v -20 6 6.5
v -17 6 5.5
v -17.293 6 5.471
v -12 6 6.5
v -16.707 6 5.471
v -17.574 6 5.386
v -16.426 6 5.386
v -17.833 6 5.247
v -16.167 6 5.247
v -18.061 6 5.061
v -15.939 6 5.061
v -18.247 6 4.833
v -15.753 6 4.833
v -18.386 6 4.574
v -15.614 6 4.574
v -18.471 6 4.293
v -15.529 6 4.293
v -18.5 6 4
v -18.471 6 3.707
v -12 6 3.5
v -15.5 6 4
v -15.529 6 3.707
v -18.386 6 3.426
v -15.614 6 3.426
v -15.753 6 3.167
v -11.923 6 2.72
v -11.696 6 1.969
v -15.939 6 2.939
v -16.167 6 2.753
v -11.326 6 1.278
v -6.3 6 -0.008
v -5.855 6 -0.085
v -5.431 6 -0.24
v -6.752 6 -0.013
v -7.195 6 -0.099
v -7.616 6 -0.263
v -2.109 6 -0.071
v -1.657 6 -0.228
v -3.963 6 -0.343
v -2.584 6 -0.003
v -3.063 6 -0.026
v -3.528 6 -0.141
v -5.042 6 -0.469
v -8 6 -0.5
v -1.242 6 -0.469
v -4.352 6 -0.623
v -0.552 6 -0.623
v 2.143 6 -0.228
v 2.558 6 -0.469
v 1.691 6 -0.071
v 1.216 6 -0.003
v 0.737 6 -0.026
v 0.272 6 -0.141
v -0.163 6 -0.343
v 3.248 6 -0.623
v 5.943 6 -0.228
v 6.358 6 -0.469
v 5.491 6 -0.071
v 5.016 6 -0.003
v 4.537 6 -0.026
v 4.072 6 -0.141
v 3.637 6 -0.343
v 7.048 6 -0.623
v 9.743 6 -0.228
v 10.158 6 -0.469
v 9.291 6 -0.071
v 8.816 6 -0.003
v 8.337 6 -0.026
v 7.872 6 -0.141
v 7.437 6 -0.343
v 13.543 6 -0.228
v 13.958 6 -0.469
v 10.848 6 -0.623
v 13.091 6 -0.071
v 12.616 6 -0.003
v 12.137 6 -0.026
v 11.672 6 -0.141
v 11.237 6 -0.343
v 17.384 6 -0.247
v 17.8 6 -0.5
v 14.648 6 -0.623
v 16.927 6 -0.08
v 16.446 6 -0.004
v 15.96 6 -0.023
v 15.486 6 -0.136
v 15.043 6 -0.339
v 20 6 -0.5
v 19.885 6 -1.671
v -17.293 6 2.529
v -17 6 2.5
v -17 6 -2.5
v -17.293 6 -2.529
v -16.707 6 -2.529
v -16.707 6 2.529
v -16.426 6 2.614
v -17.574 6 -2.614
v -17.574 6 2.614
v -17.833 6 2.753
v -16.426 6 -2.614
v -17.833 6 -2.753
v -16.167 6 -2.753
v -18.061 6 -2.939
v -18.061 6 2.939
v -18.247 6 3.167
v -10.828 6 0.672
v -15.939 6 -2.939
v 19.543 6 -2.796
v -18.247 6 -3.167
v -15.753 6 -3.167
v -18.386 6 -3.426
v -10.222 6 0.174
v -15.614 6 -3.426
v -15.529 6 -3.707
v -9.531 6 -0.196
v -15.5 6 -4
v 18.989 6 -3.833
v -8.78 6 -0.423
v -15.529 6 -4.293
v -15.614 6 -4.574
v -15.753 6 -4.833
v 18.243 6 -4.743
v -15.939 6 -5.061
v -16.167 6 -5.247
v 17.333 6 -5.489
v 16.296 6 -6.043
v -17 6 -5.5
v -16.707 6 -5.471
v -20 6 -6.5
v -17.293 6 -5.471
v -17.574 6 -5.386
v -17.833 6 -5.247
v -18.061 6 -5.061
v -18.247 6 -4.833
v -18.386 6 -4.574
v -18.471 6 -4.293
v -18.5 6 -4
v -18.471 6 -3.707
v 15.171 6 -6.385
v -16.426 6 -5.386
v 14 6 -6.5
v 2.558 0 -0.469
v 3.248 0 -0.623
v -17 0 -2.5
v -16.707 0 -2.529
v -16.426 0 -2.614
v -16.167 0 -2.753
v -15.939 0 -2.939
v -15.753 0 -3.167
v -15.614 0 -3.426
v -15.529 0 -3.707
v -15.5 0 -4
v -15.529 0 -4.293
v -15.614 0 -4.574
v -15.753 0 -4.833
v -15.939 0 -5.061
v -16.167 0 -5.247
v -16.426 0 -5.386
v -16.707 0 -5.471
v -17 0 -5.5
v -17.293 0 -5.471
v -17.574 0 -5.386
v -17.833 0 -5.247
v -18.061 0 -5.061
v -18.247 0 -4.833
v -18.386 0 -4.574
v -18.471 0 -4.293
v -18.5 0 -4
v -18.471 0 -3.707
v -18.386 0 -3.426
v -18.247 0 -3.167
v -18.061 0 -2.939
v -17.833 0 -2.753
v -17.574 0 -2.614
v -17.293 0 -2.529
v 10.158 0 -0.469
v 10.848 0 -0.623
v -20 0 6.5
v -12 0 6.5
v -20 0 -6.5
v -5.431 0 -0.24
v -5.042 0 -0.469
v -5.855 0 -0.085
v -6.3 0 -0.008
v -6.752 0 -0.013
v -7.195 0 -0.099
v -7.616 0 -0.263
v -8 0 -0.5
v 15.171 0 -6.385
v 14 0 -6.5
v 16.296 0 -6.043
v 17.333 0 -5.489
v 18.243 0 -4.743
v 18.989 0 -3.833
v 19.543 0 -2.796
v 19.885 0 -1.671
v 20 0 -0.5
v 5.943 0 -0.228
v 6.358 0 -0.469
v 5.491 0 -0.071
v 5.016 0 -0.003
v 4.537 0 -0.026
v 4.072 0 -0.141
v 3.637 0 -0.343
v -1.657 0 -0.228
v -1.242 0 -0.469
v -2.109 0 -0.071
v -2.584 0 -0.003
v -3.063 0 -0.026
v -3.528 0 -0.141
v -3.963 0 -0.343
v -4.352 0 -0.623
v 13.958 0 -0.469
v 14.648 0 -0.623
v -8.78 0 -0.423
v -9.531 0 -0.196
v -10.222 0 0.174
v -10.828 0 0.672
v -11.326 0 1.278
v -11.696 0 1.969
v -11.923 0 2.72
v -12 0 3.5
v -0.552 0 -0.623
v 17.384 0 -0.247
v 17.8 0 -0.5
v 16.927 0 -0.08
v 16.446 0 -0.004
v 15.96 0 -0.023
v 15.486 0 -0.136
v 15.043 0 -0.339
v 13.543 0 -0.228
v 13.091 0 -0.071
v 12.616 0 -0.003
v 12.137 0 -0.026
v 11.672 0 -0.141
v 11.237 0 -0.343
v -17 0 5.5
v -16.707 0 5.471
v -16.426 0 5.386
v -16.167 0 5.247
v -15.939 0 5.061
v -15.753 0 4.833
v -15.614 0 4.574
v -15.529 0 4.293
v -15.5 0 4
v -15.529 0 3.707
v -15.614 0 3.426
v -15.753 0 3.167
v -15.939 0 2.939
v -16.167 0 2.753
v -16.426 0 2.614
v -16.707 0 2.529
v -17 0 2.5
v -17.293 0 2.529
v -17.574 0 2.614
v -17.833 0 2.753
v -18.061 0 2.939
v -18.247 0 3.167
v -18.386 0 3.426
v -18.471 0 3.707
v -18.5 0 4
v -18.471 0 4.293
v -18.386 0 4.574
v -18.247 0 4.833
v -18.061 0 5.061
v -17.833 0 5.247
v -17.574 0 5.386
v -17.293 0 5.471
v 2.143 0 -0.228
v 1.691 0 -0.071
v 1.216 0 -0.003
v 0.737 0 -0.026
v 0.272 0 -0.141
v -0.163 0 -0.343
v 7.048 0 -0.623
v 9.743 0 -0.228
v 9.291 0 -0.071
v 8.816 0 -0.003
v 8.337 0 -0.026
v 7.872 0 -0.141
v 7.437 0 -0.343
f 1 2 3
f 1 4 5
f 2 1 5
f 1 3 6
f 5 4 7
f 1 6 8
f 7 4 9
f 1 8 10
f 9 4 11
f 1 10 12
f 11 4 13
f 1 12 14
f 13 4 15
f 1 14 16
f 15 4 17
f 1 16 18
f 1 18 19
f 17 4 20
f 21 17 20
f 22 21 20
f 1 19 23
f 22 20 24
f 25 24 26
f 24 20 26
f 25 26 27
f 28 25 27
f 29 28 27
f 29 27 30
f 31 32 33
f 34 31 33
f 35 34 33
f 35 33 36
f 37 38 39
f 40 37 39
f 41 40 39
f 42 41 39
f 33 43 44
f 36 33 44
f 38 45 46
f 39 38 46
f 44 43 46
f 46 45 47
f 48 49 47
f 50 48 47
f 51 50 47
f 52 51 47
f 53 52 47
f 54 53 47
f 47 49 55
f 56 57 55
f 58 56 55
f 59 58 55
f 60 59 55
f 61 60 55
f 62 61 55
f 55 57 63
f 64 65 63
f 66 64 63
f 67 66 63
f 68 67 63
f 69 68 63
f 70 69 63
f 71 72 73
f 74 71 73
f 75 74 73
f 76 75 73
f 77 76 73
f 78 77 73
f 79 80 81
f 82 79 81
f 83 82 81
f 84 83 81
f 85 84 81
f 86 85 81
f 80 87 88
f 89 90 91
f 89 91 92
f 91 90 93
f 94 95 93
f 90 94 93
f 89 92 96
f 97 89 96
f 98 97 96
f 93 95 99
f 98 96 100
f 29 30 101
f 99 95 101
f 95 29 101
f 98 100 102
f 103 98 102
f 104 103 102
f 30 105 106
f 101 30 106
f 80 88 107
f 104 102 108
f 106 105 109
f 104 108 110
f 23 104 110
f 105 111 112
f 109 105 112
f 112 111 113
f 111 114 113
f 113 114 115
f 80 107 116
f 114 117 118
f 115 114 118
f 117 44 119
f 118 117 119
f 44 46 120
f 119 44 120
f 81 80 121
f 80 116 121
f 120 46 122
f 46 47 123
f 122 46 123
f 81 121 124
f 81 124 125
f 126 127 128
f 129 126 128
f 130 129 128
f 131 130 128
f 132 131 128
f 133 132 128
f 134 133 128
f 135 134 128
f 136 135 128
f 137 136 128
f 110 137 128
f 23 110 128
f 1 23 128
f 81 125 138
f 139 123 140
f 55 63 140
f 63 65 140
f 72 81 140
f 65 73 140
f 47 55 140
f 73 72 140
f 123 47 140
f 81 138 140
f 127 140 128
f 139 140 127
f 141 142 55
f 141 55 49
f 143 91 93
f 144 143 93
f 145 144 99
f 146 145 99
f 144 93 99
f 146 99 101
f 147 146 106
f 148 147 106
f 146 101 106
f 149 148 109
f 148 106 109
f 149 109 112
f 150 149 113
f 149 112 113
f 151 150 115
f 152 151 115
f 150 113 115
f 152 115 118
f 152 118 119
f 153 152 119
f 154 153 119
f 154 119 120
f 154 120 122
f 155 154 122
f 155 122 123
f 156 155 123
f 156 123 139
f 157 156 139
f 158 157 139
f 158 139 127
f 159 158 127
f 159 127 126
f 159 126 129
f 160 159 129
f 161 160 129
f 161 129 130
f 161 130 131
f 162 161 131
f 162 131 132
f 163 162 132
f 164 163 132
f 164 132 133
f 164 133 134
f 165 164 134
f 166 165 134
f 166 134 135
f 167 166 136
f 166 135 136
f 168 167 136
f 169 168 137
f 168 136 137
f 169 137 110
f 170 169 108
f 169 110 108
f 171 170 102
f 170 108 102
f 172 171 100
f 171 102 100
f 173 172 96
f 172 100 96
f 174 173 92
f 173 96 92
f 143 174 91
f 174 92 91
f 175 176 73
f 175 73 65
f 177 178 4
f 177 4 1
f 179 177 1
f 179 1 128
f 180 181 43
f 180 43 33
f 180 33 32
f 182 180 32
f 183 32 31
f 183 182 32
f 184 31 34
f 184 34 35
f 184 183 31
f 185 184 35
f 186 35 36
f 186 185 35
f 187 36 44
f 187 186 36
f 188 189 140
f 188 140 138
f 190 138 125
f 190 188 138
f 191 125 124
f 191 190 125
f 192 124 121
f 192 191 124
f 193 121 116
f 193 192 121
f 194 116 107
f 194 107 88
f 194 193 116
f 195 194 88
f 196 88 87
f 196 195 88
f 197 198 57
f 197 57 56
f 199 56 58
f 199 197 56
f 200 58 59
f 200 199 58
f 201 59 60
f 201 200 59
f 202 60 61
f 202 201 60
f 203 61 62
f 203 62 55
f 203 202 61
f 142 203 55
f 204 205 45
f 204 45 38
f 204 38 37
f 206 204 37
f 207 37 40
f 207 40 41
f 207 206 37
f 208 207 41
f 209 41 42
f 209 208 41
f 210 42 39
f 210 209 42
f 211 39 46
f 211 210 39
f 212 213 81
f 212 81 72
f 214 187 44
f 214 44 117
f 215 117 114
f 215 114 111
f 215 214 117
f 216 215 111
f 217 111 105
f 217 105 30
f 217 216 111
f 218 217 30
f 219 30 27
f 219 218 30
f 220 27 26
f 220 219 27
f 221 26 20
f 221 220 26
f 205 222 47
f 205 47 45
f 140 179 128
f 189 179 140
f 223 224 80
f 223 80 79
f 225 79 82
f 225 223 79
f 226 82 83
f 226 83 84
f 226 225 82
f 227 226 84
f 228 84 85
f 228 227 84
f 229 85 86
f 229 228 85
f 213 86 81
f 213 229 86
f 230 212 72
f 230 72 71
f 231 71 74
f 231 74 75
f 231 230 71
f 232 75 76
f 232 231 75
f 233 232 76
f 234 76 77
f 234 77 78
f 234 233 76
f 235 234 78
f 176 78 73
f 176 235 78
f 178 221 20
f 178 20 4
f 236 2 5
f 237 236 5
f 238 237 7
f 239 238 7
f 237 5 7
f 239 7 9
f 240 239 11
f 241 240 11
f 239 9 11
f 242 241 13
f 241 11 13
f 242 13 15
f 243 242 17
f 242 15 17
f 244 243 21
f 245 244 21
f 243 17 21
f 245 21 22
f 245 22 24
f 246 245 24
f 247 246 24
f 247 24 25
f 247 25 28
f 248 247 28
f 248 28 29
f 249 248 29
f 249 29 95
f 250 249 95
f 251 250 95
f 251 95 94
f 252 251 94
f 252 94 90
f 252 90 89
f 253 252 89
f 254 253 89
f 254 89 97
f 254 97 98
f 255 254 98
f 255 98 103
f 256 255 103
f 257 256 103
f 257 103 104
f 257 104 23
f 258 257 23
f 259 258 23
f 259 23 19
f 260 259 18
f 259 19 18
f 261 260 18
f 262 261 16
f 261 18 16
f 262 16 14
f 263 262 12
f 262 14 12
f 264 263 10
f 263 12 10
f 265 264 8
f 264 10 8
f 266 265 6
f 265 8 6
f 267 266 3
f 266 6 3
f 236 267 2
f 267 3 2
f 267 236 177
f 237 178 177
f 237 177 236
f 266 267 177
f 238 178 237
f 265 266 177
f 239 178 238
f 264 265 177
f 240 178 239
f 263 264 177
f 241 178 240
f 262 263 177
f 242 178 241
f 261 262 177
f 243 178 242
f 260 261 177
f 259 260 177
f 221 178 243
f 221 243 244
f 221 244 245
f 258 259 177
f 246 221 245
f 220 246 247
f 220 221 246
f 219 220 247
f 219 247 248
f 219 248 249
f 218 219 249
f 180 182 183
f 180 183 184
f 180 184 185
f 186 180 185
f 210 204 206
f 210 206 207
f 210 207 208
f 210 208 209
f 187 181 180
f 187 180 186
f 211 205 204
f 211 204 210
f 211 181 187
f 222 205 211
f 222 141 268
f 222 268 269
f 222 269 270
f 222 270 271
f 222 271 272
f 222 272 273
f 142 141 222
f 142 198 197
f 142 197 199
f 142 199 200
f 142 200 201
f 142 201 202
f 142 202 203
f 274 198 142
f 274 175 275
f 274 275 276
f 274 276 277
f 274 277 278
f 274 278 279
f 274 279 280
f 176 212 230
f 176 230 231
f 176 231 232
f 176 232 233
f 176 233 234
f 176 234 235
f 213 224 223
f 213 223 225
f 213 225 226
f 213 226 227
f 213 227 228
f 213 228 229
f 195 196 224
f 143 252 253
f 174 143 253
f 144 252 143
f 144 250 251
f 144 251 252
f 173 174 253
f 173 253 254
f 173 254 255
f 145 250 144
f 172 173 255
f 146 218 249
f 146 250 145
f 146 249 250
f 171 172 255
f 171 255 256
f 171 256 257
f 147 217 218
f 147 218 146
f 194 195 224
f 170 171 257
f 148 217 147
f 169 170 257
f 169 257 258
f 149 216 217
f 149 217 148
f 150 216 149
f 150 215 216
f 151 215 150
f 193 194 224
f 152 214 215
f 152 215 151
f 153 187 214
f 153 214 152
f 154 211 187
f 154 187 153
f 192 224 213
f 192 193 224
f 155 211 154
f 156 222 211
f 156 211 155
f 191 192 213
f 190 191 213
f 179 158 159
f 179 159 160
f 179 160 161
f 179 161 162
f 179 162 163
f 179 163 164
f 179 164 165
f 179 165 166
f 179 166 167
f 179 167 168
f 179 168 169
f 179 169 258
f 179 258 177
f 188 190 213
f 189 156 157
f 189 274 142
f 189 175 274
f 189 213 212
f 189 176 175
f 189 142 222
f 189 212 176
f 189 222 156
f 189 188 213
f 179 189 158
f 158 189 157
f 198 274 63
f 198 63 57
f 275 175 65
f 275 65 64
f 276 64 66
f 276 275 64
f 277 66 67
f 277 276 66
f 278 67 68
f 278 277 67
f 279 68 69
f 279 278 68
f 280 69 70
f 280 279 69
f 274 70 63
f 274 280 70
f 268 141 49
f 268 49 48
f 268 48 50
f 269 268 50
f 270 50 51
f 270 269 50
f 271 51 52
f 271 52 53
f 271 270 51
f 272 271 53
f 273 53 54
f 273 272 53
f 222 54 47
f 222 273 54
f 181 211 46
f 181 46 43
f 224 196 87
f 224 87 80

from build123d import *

# Parameters (mm, degrees)
BOSS_EXTRUDE1_DEPTH = 6
SKETCH2_R           = 1.5
CUT_EXTRUDE1_DEPTH  = 22.868927729


with BuildPart() as part:
    # Sketch1 → Boss-Extrude1 (new body)
    with BuildSketch(Plane.XZ):
        with BuildLine():
            Line((20, -0.5), (17.8, -0.5))
            ThreePointArc((17.8, -0.5), (16.025787821, -0.015083969), (14.4, -0.875192319))
            ThreePointArc((14.4, -0.875192319), (12.5, 0), (10.6, -0.875192319))
            ThreePointArc((10.6, -0.875192319), (8.7, 0), (6.8, -0.875192319))
            ThreePointArc((6.8, -0.875192319), (4.9, 0), (3, -0.875192319))
            ThreePointArc((3, -0.875192319), (1.1, 0), (-0.8, -0.875192319))
            ThreePointArc((-0.8, -0.875192319), (-2.7, 0), (-4.6, -0.875192319))
            ThreePointArc((-4.6, -0.875192319), (-6.225787821, -0.015083969), (-8, -0.5))
            ThreePointArc((-8, -0.5), (-10.828427125, 0.671572875), (-12, 3.5))
            Line((-12, 3.5), (-12, 6.5))
            Line((-12, 6.5), (-20, 6.5))
            Line((-20, 6.5), (-20, -6.5))
            Line((-20, -6.5), (14, -6.5))
            ThreePointArc((14, -6.5), (18.242640687, -4.742640687), (20, -0.5))
        make_face()
    extrude(amount=-BOSS_EXTRUDE1_DEPTH)

    # Chamfer1
    # the kernel refuses this chamfer: 0.5, 0.339586842 mm, written as the material it adds along each edge
    with BuildSketch(Plane(origin=(-4.6, 0, -0.875192319), x_dir=(0.7020641169662168, 0, 0.7121137378736954), z_dir=(0, 1, 0)), Plane(origin=(-0.8, 0, -0.875192319), x_dir=(0.7020641169662151, 0, 0.7121137378736971), z_dir=(0, 1, 0)), Plane(origin=(3, 0, -0.875192319), x_dir=(0.7020641169662145, 0, 0.7121137378736978), z_dir=(0, 1, 0)), Plane(origin=(6.8, 0, -0.875192319), x_dir=(0.7020641169662162, 0, 0.712113737873696), z_dir=(0, 1, 0)), Plane(origin=(10.6, 0, -0.875192319), x_dir=(0.7020641169662151, 0, 0.7121137378736971), z_dir=(0, 1, 0)), Plane(origin=(14.4, 0, -0.875192319), x_dir=(0.702064116966188, 0, 0.7121137378737239), z_dir=(0, 1, 0))) as chamfer1_piece_1:
        with BuildLine():
            Line((0.353747902, 0), (-0.021236492, -0.600134418))
            ThreePointArc((-0.021236492, -0.600134418), (0.007142061, -0.309444564), (0, 0))
            ThreePointArc((0, 0), (0.182204356, -0.006259046), (0.353747902, 0))
        make_face()
    extrude(amount=6)

    # Sketch2 → Cut-Extrude1 (cut, through all)
    with BuildSketch(Plane(origin=(0, 6, 0), x_dir=(1, 0, 0), z_dir=(0, 1, 0))):
        with Locations(Location((-17, 4, 0), (0, 0, 270))):
            Circle(SKETCH2_R)
        with Locations(Location((-17, -4, 0), (0, 0, 270))):
            Circle(SKETCH2_R)
    extrude(amount=-CUT_EXTRUDE1_DEPTH, mode=Mode.SUBTRACT)


solid = part.part
